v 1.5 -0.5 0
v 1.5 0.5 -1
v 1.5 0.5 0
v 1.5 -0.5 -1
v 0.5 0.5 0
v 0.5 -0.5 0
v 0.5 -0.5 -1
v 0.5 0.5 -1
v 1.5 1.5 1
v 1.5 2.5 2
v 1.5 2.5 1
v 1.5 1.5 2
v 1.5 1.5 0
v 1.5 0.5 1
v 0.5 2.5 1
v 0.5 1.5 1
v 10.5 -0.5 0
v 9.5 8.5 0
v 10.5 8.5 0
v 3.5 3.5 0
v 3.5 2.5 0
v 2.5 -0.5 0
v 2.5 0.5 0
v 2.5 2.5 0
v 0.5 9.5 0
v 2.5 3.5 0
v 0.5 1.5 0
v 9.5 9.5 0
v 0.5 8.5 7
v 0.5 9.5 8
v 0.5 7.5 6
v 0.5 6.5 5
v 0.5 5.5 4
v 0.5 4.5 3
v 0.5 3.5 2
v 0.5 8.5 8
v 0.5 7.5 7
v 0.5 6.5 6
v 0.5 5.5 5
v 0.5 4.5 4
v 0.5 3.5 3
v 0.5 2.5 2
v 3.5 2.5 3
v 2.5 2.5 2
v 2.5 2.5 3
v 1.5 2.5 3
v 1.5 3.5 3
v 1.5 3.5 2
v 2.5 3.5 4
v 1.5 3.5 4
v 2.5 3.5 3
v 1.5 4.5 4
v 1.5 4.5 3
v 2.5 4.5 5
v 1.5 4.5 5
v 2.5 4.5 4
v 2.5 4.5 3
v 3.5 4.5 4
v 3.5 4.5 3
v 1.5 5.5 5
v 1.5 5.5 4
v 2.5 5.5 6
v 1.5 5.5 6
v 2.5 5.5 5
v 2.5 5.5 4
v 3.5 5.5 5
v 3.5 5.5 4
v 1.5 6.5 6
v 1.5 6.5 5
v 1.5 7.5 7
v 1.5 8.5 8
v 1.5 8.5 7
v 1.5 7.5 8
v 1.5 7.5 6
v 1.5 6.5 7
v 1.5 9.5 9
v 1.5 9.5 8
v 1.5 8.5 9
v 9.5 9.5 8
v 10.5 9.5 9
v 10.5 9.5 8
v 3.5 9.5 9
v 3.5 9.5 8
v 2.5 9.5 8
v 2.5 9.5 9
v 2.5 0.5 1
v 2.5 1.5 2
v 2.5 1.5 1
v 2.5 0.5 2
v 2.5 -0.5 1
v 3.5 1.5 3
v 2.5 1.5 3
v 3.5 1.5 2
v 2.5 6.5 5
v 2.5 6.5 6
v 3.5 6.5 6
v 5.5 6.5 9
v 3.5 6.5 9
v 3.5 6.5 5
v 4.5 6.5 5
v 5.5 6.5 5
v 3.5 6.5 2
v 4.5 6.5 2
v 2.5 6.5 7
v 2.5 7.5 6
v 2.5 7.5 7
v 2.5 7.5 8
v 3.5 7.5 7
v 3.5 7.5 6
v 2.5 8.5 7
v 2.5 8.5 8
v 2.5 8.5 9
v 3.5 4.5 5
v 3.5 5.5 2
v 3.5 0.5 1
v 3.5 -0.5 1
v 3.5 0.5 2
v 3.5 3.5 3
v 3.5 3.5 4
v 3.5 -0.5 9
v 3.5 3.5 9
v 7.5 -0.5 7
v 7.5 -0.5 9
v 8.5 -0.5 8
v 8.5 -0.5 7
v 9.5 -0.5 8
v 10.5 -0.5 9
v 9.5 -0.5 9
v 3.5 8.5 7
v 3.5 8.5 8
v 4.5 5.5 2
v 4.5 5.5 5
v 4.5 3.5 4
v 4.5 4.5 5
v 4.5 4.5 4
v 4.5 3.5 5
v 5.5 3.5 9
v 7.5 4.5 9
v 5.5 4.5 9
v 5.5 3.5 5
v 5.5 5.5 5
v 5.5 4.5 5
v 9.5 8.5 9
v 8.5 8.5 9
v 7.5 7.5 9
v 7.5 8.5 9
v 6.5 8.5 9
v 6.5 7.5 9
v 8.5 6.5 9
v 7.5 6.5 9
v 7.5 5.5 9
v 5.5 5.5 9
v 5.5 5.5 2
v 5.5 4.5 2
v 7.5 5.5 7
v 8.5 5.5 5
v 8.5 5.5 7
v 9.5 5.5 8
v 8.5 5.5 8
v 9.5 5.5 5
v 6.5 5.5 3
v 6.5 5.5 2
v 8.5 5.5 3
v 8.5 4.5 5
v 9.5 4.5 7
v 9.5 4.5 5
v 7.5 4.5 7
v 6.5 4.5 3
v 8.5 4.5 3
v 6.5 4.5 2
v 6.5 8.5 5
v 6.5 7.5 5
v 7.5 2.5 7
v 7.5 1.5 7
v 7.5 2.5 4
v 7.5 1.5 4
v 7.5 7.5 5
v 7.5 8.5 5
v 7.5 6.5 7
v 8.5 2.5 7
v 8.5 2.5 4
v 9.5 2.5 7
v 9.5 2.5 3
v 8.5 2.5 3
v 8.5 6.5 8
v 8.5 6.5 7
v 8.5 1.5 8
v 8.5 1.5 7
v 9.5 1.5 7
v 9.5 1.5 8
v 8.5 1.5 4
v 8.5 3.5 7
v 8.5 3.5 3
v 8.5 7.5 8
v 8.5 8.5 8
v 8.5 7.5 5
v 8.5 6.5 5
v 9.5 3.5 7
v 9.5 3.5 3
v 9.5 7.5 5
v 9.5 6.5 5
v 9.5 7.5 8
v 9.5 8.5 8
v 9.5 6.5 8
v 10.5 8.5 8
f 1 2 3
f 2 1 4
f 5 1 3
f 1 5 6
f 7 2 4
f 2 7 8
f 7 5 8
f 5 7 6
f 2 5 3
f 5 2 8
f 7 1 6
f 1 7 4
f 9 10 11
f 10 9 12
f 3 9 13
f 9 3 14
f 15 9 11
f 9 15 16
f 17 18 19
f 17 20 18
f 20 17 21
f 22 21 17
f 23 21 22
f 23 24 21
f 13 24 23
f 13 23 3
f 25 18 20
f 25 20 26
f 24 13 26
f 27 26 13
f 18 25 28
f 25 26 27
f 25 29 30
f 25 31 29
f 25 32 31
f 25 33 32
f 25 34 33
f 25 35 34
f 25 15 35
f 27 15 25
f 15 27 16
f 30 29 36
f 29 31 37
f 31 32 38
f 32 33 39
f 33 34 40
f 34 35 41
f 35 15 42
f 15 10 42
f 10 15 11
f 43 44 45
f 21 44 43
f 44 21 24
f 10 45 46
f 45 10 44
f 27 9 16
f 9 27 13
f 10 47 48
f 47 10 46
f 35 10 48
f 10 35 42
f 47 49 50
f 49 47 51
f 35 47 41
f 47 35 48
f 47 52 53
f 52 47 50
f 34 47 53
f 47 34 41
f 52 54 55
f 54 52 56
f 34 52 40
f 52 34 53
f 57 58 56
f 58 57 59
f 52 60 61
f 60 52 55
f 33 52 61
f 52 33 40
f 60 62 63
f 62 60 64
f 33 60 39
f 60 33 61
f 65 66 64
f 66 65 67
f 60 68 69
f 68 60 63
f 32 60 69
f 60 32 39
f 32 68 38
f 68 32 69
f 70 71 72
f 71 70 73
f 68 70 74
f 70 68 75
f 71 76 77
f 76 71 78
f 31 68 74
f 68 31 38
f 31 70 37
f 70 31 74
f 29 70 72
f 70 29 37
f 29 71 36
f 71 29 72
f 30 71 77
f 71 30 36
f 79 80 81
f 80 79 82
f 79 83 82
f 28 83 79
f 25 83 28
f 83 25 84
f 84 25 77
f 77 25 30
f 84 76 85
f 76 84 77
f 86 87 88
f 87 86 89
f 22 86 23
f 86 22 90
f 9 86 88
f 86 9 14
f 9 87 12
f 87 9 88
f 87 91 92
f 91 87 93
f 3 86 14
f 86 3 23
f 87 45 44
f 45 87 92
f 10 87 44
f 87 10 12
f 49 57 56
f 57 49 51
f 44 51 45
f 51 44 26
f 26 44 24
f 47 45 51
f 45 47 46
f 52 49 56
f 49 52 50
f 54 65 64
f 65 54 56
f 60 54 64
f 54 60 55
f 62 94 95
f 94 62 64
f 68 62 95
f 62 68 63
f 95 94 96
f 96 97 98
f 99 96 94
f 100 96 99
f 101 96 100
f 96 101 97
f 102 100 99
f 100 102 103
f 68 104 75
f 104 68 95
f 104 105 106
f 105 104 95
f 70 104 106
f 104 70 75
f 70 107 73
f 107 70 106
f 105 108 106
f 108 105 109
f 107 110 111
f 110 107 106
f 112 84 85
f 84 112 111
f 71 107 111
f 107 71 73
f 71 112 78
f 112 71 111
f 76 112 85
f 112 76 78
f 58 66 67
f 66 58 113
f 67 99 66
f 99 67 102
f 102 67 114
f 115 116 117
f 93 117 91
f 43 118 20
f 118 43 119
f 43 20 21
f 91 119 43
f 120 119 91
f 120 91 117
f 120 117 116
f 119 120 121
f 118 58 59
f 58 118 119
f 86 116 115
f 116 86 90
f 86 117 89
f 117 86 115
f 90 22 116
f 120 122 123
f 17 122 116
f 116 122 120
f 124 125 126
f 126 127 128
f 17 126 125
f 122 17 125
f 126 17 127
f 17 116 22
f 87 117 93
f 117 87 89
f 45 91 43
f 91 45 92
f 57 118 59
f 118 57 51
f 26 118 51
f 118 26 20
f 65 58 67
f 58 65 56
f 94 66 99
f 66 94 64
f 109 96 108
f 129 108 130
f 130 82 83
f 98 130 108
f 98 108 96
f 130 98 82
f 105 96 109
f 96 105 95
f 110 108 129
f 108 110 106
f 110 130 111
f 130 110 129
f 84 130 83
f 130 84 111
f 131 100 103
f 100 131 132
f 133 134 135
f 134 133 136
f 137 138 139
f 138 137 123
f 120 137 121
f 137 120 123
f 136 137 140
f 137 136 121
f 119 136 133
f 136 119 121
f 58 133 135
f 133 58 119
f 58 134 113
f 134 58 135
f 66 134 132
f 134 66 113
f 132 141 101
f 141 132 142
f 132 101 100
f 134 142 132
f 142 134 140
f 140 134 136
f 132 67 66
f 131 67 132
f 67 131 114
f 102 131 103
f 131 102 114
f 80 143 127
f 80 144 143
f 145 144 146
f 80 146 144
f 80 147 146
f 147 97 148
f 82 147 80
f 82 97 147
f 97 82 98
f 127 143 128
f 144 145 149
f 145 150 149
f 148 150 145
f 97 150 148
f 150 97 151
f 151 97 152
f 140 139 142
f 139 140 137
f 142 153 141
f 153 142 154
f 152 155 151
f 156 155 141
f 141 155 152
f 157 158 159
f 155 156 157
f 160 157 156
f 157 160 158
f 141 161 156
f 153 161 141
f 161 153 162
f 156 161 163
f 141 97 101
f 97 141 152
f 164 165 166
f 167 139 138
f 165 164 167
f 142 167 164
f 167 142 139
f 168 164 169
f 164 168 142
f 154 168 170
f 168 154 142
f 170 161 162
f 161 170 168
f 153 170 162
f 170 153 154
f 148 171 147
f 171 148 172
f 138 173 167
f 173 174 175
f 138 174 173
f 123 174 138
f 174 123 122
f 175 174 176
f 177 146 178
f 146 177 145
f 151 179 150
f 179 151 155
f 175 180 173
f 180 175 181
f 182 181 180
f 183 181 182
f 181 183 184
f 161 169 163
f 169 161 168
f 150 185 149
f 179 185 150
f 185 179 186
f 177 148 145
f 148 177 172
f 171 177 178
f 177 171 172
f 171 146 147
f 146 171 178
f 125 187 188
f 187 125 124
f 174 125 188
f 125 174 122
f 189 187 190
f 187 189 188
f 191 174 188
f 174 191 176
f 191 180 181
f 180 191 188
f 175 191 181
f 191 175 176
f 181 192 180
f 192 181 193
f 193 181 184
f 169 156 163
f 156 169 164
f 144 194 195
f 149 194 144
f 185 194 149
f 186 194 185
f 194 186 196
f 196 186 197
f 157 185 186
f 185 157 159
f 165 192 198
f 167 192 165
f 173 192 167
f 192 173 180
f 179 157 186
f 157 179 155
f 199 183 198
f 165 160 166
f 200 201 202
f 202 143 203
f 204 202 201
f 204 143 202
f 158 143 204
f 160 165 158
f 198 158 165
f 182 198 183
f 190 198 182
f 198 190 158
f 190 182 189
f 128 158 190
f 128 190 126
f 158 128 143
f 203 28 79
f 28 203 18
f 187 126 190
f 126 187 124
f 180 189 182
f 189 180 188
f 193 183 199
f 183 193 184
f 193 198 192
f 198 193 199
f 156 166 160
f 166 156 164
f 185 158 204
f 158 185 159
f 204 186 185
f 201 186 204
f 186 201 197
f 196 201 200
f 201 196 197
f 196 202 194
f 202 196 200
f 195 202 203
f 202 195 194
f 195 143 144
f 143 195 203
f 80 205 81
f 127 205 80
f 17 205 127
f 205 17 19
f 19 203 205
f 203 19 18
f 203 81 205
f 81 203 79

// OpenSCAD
union() {
    translate([1, 0, -0.5]) color([1, 0, 0]) cube([1, 1, 1], center=true);
    translate([1, 2, 0.5]) cube([1, 1, 1], center=true);
    translate([1, 3, 1.0]) cube([1, 1, 2], center=true);
    translate([1, 4, 1.5]) cube([1, 1, 3], center=true);
    translate([1, 5, 2.0]) cube([1, 1, 4], center=true);
    translate([1, 6, 2.5]) cube([1, 1, 5], center=true);
    translate([1, 7, 3.0]) cube([1, 1, 6], center=true);
    translate([1, 8, 3.5]) cube([1, 1, 7], center=true);
    translate([1, 9, 4.0]) cube([1, 1, 8], center=true);
    translate([2, 1, 0.5]) cube([1, 1, 1], center=true);
    translate([2, 2, 1.0]) cube([1, 1, 2], center=true);
    translate([2, 3, 1.5]) cube([1, 1, 3], center=true);
    translate([2, 4, 2.0]) cube([1, 1, 4], center=true);
    translate([2, 5, 2.5]) cube([1, 1, 5], center=true);
    translate([2, 6, 3.0]) cube([1, 1, 6], center=true);
    translate([2, 7, 3.5]) cube([1, 1, 7], center=true);
    translate([2, 8, 4.0]) cube([1, 1, 8], center=true);
    translate([2, 9, 4.5]) cube([1, 1, 9], center=true);
    translate([3, 0, 0.5]) cube([1, 1, 1], center=true);
    translate([3, 1, 1.0]) cube([1, 1, 2], center=true);
    translate([3, 2, 1.5]) cube([1, 1, 3], center=true);
    translate([3, 4, 1.5]) cube([1, 1, 3], center=true);
    translate([3, 5, 2.0]) cube([1, 1, 4], center=true);
    translate([3, 6, 2.5]) cube([1, 1, 5], center=true);
    translate([3, 7, 3.0]) cube([1, 1, 6], center=true);
    translate([3, 8, 3.5]) cube([1, 1, 7], center=true);
    translate([3, 9, 4.0]) cube([1, 1, 8], center=true);
    translate([4, 0, 4.5]) cube([1, 1, 9], center=true);
    translate([4, 1, 4.5]) cube([1, 1, 9], center=true);
    translate([4, 2, 4.5]) cube([1, 1, 9], center=true);
    translate([4, 3, 4.5]) cube([1, 1, 9], center=true);
    translate([4, 4, 2.0]) cube([1, 1, 4], center=true);
    translate([4, 5, 2.5]) cube([1, 1, 5], center=true);
    translate([4, 6, 1.0]) cube([1, 1, 2], center=true);
    translate([4, 7, 4.5]) cube([1, 1, 9], center=true);
    translate([4, 8, 4.5]) cube([1, 1, 9], center=true);
    translate([4, 9, 4.5]) cube([1, 1, 9], center=true);
    translate([5, 0, 4.5]) cube([1, 1, 9], center=true);
    translate([5, 1, 4.5]) cube([1, 1, 9], center=true);
    translate([5, 2, 4.5]) cube([1, 1, 9], center=true);
    translate([5, 3, 4.5]) cube([1, 1, 9], center=true);
    translate([5, 4, 2.5]) cube([1, 1, 5], center=true);
    translate([5, 5, 2.5]) cube([1, 1, 5], center=true);
    translate([5, 6, 2.5]) cube([1, 1, 5], center=true);
    translate([5, 7, 4.5]) cube([1, 1, 9], center=true);
    translate([5, 8, 4.5]) cube([1, 1, 9], center=true);
    translate([5, 9, 4.5]) cube([1, 1, 9], center=true);
    translate([6, 0, 4.5]) cube([1, 1, 9], center=true);
    translate([6, 1, 4.5]) cube([1, 1, 9], center=true);
    translate([6, 2, 4.5]) cube([1, 1, 9], center=true);
    translate([6, 3, 4.5]) cube([1, 1, 9], center=true);
    translate([6, 4, 4.5]) cube([1, 1, 9], center=true);
    translate([6, 5, 1.0]) cube([1, 1, 2], center=true);
    translate([6, 6, 4.5]) cube([1, 1, 9], center=true);
    translate([6, 7, 4.5]) cube([1, 1, 9], center=true);
    translate([6, 8, 4.5]) cube([1, 1, 9], center=true);
    translate([6, 9, 4.5]) cube([1, 1, 9], center=true);
    translate([7, 0, 4.5]) cube([1, 1, 9], center=true);
    translate([7, 1, 4.5]) cube([1, 1, 9], center=true);
    translate([7, 2, 4.5]) cube([1, 1, 9], center=true);
    translate([7, 3, 4.5]) cube([1, 1, 9], center=true);
    translate([7, 4, 4.5]) cube([1, 1, 9], center=true);
    translate([7, 5, 1.5]) cube([1, 1, 3], center=true);
    translate([7, 6, 4.5]) cube([1, 1, 9], center=true);
    translate([7, 7, 4.5]) cube([1, 1, 9], center=true);
    translate([7, 8, 2.5]) cube([1, 1, 5], center=true);
    translate([7, 9, 4.5]) cube([1, 1, 9], center=true);
    translate([8, 0, 3.5]) cube([1, 1, 7], center=true);
    translate([8, 1, 3.5]) cube([1, 1, 7], center=true);
    translate([8, 2, 2.0]) cube([1, 1, 4], center=true);
    translate([8, 3, 3.5]) cube([1, 1, 7], center=true);
    translate([8, 4, 3.5]) cube([1, 1, 7], center=true);
    translate([8, 5, 1.5]) cube([1, 1, 3], center=true);
    translate([8, 6, 3.5]) cube([1, 1, 7], center=true);
    translate([8, 7, 4.5]) cube([1, 1, 9], center=true);
    translate([8, 8, 4.5]) cube([1, 1, 9], center=true);
    translate([8, 9, 4.5]) cube([1, 1, 9], center=true);
    translate([9, 0, 4.0]) cube([1, 1, 8], center=true);
    translate([9, 1, 4.0]) cube([1, 1, 8], center=true);
    translate([9, 2, 3.5]) cube([1, 1, 7], center=true);
    translate([9, 3, 1.5]) cube([1, 1, 3], center=true);
    translate([9, 4, 3.5]) cube([1, 1, 7], center=true);
    translate([9, 5, 2.5]) cube([1, 1, 5], center=true);
    translate([9, 6, 4.0]) cube([1, 1, 8], center=true);
    translate([9, 7, 2.5]) cube([1, 1, 5], center=true);
    translate([9, 8, 4.0]) cube([1, 1, 8], center=true);
    translate([9, 9, 4.5]) cube([1, 1, 9], center=true);
    translate([10, 0, 4.5]) cube([1, 1, 9], center=true);
    translate([10, 1, 4.5]) cube([1, 1, 9], center=true);
    translate([10, 2, 4.5]) cube([1, 1, 9], center=true);
    translate([10, 3, 4.5]) cube([1, 1, 9], center=true);
    translate([10, 4, 4.5]) cube([1, 1, 9], center=true);
    translate([10, 5, 4.5]) cube([1, 1, 9], center=true);
    translate([10, 6, 4.5]) cube([1, 1, 9], center=true);
    translate([10, 7, 4.5]) cube([1, 1, 9], center=true);
    translate([10, 8, 4.5]) cube([1, 1, 9], center=true);
    translate([10, 9, 8.5]) color([0, 0, 1]) cube([1, 1, 1], center=true);
}
